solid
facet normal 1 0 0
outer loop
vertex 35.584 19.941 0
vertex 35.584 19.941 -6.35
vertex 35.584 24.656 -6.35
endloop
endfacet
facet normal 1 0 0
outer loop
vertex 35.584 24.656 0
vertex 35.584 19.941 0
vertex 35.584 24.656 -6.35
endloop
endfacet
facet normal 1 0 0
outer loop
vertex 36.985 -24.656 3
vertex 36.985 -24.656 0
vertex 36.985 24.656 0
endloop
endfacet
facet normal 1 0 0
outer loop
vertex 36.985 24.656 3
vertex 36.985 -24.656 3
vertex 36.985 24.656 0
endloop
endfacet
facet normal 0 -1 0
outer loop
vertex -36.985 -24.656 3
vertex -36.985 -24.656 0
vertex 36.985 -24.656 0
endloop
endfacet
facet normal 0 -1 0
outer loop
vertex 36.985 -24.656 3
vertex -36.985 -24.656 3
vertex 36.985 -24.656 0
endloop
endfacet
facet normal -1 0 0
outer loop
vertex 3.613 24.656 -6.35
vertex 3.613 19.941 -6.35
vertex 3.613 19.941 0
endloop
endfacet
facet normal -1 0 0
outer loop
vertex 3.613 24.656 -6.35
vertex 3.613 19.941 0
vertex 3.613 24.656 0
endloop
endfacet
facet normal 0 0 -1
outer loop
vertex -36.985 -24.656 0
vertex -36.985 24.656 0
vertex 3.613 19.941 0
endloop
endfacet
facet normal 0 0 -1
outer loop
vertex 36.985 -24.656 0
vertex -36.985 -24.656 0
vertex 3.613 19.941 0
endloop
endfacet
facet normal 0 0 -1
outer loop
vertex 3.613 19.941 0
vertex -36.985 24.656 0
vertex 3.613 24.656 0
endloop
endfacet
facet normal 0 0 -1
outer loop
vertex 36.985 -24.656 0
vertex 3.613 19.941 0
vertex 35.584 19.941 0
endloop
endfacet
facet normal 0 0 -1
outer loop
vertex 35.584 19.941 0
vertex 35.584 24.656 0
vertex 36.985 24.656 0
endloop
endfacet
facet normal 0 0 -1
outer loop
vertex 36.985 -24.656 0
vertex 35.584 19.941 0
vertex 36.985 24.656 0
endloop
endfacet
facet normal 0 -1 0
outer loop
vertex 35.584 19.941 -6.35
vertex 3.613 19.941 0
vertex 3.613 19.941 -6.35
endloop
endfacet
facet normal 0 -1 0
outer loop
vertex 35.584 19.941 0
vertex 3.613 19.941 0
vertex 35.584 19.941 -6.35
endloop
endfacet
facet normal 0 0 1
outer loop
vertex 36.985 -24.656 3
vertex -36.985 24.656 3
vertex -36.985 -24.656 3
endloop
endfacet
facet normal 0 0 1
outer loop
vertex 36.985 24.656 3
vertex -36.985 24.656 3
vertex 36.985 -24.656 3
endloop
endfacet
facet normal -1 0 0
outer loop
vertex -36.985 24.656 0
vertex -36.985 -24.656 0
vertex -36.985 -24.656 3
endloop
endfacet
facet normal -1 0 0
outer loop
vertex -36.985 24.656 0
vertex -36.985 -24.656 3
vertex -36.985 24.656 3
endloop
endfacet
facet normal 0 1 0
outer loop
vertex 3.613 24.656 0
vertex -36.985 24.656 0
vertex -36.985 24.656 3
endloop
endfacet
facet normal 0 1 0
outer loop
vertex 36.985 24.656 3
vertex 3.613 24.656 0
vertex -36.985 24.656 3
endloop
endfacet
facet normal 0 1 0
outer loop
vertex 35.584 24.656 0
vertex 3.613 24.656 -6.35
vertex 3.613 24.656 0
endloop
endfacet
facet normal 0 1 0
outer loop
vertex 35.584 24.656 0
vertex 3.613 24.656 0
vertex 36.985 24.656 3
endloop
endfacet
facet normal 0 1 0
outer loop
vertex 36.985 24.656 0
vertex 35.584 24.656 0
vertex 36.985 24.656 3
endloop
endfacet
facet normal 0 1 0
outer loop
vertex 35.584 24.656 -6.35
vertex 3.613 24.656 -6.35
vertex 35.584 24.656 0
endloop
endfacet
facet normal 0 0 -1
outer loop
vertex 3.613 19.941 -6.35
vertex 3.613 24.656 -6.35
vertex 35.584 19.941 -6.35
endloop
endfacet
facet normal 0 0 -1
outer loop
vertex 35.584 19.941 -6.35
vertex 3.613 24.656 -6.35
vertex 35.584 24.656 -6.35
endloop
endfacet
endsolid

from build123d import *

# Parameters (mm, degrees)
SKETCH1_W           = 73.969271166
SKETCH1_H           = 49.312847444
BOSS_EXTRUDE1_DEPTH = 3.000000096
SKETCH2_W           = 31.971798189
SKETCH2_H           = 4.7152652
BOSS_EXTRUDE2_DEPTH = 6.35


with BuildPart() as part:
    # Sketch1 → Boss-Extrude1 (new body)
    with BuildSketch(Plane.XY):
        Rectangle(SKETCH1_W, SKETCH1_H)
    extrude(amount=BOSS_EXTRUDE1_DEPTH)

    # Sketch2 → Boss-Extrude2 (add)
    with BuildSketch(Plane.XY):
        with Locations((19.598546823, 22.298791122)):
            Rectangle(SKETCH2_W, SKETCH2_H)
    extrude(amount=-BOSS_EXTRUDE2_DEPTH)


solid = part.part
